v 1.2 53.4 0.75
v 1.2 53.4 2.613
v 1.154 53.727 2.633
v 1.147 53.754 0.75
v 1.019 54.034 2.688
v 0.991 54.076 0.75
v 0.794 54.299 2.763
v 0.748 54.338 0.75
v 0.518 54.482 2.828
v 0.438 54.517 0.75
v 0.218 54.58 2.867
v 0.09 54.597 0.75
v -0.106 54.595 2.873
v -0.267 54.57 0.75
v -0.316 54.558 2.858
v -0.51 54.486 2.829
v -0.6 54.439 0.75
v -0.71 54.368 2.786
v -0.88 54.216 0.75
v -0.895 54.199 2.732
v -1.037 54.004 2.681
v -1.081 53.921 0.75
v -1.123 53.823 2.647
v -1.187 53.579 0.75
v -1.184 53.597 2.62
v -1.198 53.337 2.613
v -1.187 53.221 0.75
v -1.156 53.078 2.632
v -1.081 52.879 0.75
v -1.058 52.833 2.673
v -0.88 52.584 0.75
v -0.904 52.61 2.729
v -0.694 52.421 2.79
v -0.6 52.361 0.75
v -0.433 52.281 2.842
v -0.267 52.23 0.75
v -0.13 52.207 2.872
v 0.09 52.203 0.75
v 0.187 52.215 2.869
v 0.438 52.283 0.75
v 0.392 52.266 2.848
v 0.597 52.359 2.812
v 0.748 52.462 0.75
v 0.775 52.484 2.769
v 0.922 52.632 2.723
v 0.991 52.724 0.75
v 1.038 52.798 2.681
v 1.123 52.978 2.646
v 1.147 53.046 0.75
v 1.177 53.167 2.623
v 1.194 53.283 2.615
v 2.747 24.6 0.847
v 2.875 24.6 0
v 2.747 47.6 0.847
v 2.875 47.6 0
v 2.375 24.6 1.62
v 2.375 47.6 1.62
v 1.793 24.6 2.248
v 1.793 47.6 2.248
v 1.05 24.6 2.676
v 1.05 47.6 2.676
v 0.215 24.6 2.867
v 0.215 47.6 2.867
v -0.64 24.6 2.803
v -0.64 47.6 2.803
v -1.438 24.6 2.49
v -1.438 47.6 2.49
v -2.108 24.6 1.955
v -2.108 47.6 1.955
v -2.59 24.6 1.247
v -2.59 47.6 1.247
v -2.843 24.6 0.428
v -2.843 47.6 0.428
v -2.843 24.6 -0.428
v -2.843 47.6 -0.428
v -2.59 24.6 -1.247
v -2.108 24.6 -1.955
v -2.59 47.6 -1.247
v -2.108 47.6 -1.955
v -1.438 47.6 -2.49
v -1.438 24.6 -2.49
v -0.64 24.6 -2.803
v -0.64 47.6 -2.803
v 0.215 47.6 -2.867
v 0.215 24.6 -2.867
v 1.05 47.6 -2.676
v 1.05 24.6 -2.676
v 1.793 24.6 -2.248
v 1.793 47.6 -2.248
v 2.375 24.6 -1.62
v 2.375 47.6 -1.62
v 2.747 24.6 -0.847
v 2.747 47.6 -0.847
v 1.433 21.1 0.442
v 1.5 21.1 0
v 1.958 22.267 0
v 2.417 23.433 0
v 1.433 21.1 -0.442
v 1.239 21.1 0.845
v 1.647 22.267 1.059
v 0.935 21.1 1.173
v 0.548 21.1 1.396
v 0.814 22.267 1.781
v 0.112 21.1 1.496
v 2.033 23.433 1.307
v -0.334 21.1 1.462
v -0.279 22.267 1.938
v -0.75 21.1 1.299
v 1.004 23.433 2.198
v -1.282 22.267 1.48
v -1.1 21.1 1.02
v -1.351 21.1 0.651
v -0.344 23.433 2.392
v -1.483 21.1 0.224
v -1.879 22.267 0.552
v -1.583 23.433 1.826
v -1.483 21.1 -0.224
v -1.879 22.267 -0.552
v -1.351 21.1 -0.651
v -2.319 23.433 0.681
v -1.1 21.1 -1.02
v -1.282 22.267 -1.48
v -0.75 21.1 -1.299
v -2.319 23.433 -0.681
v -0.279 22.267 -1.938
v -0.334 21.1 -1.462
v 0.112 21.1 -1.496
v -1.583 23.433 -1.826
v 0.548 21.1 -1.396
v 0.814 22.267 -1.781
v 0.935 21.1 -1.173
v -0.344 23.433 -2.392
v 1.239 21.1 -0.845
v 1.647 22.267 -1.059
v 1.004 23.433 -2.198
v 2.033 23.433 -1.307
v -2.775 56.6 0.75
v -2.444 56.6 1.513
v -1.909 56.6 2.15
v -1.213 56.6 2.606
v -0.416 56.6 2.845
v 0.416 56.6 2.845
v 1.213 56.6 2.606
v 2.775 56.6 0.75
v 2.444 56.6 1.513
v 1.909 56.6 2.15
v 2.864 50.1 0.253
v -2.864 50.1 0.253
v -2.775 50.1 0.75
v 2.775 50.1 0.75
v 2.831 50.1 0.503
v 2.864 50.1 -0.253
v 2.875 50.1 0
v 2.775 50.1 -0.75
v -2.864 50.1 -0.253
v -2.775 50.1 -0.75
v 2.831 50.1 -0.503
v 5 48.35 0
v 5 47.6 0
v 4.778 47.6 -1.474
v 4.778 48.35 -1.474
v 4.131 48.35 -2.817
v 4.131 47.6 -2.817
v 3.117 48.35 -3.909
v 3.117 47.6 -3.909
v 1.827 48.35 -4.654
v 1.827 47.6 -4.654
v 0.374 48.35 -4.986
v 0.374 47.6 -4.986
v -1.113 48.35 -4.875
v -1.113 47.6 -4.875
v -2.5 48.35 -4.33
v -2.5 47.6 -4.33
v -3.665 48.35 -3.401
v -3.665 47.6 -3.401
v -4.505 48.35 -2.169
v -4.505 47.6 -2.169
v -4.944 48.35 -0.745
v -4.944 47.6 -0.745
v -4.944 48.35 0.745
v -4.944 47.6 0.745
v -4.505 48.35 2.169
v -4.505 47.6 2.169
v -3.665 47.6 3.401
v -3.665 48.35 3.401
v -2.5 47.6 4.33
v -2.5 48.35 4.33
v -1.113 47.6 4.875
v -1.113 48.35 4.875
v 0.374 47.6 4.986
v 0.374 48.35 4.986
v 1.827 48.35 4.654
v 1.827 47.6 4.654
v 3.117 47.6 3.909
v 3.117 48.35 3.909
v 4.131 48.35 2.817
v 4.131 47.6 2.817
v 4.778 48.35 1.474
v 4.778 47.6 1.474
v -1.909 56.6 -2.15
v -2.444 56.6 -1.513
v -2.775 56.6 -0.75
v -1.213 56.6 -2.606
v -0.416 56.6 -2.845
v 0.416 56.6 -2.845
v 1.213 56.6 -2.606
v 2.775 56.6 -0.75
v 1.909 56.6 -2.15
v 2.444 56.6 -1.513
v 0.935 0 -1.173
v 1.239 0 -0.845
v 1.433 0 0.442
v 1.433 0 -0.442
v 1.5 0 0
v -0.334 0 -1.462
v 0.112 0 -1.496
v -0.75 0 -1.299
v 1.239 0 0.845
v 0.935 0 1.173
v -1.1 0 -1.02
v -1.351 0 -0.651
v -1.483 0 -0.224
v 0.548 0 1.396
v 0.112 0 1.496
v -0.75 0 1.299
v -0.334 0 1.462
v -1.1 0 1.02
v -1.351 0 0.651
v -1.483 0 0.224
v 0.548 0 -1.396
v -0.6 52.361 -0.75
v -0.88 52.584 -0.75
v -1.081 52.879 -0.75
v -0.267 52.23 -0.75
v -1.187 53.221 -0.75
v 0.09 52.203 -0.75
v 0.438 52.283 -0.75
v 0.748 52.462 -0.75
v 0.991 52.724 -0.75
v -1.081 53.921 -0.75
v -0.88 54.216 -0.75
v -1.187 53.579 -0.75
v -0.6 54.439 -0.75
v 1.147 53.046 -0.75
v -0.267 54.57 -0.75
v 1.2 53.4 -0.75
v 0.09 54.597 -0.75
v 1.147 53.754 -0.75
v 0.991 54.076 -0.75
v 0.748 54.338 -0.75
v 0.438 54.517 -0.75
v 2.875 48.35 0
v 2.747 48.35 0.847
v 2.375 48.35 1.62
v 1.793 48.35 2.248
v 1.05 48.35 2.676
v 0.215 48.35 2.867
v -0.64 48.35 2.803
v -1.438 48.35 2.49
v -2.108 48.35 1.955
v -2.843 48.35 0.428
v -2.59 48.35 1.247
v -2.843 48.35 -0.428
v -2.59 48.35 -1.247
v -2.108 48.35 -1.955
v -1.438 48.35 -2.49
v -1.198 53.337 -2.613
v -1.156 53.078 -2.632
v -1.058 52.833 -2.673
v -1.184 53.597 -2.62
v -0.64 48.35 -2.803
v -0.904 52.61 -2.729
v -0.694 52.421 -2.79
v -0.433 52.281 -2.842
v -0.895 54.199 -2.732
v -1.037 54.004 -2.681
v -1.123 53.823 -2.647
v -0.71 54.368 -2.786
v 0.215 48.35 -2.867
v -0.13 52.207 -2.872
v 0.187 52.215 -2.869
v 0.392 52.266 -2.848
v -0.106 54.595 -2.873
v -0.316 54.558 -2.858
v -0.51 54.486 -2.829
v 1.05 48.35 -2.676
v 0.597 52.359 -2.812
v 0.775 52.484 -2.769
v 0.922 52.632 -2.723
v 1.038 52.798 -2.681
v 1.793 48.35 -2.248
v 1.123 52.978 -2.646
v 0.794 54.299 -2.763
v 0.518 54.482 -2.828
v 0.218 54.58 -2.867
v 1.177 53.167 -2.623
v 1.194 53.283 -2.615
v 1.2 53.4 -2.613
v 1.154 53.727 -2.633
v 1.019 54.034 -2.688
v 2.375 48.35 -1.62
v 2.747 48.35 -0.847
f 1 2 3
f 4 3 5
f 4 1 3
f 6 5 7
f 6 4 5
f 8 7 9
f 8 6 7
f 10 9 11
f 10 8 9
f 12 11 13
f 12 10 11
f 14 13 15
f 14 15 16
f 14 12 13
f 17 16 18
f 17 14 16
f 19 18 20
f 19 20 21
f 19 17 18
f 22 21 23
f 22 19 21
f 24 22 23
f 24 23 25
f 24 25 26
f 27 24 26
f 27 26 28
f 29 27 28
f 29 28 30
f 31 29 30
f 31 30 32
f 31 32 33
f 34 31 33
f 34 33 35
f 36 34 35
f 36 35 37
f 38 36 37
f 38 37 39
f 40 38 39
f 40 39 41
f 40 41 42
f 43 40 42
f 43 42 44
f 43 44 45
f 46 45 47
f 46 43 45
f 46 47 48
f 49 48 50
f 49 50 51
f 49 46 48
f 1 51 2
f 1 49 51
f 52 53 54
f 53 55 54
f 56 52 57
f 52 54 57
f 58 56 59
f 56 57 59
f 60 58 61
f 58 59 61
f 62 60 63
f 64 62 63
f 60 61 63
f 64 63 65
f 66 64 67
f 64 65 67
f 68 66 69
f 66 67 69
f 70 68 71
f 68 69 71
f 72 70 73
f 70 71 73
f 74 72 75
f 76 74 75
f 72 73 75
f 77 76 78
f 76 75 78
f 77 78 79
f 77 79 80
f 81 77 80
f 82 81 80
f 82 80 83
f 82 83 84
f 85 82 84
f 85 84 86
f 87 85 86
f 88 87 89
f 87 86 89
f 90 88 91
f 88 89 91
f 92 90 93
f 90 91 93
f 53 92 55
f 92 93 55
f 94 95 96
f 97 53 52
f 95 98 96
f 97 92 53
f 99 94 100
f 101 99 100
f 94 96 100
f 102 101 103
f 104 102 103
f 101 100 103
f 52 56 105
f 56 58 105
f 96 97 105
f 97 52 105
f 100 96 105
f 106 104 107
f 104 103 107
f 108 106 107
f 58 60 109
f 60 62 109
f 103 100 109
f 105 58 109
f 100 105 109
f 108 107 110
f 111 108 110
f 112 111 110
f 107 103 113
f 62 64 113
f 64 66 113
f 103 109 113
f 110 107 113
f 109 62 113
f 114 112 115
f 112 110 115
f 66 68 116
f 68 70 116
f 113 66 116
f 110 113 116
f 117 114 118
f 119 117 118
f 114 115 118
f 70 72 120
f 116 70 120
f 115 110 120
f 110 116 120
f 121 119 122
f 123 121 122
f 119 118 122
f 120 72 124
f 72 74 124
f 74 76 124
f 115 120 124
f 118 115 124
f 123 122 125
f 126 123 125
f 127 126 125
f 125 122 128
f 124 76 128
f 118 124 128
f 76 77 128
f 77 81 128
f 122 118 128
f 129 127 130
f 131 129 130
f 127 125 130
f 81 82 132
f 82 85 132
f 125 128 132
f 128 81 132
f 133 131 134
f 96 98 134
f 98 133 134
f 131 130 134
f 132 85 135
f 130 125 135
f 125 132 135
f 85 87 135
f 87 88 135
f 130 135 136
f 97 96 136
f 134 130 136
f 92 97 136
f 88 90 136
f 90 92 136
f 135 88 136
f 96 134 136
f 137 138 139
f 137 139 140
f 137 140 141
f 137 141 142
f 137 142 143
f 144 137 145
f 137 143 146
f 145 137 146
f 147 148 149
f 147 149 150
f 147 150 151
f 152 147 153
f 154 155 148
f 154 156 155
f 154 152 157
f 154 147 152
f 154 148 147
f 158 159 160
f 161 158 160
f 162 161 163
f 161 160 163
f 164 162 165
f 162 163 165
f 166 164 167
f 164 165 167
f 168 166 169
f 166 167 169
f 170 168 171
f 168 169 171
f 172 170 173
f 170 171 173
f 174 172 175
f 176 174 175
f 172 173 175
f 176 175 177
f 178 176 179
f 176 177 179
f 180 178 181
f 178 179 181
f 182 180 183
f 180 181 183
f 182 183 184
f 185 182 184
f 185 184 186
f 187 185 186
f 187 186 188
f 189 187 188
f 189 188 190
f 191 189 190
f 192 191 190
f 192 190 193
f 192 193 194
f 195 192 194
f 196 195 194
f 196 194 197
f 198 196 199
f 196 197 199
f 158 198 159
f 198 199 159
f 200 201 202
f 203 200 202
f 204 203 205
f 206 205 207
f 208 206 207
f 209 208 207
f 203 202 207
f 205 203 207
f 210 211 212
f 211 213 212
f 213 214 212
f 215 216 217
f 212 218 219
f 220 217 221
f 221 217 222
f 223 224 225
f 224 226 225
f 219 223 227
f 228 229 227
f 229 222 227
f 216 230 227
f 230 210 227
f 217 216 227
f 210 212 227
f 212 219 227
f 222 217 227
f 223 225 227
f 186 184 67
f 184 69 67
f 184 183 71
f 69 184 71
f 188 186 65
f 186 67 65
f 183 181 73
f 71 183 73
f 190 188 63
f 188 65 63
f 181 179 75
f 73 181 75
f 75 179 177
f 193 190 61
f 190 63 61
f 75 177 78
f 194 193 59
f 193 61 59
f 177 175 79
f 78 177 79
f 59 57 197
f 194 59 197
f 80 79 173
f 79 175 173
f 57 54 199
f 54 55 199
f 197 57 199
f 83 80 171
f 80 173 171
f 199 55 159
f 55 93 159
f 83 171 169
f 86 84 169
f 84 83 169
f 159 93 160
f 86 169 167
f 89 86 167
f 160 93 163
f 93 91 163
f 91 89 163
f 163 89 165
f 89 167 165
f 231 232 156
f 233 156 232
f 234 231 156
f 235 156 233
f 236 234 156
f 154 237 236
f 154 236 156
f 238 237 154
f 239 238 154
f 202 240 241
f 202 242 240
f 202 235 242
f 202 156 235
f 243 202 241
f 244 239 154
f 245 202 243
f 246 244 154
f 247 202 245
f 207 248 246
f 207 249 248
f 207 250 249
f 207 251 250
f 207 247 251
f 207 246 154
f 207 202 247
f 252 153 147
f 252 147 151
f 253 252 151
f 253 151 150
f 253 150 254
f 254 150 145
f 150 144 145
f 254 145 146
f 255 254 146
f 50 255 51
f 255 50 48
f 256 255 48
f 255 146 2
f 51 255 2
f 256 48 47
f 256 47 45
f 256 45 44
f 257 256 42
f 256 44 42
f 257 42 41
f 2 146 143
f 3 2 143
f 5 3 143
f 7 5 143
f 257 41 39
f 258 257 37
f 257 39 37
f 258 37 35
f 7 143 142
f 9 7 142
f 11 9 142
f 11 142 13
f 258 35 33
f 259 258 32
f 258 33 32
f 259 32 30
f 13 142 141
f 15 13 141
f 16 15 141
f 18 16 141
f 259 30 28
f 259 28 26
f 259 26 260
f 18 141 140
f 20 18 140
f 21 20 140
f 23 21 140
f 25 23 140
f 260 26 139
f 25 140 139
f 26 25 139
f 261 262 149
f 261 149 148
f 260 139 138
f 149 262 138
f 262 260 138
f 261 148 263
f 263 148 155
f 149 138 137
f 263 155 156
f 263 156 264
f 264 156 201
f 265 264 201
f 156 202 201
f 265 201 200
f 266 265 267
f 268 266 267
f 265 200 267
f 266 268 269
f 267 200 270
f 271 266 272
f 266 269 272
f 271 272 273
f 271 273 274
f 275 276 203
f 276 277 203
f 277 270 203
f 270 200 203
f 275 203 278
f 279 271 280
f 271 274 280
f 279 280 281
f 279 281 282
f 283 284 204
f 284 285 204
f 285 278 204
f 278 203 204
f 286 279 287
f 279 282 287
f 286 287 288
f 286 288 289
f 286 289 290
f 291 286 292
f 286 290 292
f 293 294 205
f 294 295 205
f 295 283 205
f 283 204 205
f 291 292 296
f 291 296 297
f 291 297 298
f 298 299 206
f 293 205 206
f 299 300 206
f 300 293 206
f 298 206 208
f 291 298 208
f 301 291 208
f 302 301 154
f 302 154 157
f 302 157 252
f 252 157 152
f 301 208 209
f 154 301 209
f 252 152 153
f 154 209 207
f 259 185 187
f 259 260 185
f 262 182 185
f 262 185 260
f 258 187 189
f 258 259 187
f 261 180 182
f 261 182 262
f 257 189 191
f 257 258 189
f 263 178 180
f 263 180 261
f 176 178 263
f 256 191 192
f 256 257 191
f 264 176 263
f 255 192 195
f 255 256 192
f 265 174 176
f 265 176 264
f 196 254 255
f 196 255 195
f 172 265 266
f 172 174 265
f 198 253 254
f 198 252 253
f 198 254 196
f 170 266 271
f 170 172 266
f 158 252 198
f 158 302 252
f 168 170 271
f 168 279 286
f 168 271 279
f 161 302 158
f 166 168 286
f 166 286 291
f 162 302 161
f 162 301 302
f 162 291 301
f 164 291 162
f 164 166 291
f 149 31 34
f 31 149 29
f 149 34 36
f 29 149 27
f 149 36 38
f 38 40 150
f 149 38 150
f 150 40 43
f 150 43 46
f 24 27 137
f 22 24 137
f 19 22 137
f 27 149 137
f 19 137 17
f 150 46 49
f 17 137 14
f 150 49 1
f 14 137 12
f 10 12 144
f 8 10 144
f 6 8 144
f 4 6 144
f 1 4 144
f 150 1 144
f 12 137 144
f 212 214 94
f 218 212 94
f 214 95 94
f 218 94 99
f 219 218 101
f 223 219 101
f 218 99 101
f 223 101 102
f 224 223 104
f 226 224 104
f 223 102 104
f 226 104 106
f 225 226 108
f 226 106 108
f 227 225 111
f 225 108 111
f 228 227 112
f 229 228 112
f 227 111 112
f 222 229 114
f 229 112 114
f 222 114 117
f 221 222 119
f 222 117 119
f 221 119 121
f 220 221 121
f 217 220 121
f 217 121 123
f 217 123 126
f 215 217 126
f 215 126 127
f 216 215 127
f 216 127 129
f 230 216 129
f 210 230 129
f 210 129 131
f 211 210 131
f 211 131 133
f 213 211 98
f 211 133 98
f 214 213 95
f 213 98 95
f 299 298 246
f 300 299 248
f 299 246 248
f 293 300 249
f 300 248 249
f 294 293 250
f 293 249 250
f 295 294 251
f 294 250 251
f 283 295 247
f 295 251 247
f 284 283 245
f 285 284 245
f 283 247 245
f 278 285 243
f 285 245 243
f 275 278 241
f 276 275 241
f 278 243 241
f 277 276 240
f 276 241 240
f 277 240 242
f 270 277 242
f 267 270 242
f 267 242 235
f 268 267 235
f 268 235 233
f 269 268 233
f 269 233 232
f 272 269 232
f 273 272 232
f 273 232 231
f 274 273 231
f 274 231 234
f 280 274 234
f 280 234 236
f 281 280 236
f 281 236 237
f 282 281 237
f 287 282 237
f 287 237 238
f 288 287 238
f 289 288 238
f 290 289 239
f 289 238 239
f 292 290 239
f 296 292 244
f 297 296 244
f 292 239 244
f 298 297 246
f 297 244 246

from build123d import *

# Parameters (mm, degrees)
SKETCH2_R               = 1.2
CUT_EXTRUDE1_DEPTH      = 3.875
CUT_EXTRUDE1_DEPTH_BACK = 3.875
SKETCH3_W               = 5.75
SKETCH3_H               = 1.5
CUT_EXTRUDE2_DEPTH      = 6.5
SKETCH4_R               = 5
BOSS_EXTRUDE1_DEPTH     = 0.75


with BuildPart() as part:
    # Sketch1 → Revolve1 (revolve)
    with BuildSketch(Plane.XY):
        Polygon((0, 0), (1.5, 0), (1.5, 21.1), (2.875, 24.6), (2.875, 56.6), (0, 56.6), align=None)
    revolve(axis=Axis((0, 56.6, 0), (0, -1, 0)))

    # Sketch2 → Cut-Extrude1 (cut, two sides)
    with BuildSketch(Plane.XY) as cut_extrude1_sk:
        with Locations((0, 53.4)):
            Circle(SKETCH2_R)
    extrude(amount=CUT_EXTRUDE1_DEPTH, mode=Mode.SUBTRACT)
    extrude(cut_extrude1_sk.sketch, amount=-CUT_EXTRUDE1_DEPTH_BACK, mode=Mode.SUBTRACT)

    # Sketch3 → Cut-Extrude2 (cut)
    with BuildSketch(Plane(origin=(0, 56.6, 0), x_dir=(1, 0, 0), z_dir=(0, 1, 0))):
        Rectangle(SKETCH3_W, SKETCH3_H)
    extrude(amount=-CUT_EXTRUDE2_DEPTH, mode=Mode.SUBTRACT)

    # Sketch4 → Boss-Extrude1 (add)
    with BuildSketch(Plane(origin=(0, 47.6, 0), x_dir=(1, 0, 0), z_dir=(0, 1, 0))):
        Circle(SKETCH4_R)
    extrude(amount=BOSS_EXTRUDE1_DEPTH)


solid = part.part
